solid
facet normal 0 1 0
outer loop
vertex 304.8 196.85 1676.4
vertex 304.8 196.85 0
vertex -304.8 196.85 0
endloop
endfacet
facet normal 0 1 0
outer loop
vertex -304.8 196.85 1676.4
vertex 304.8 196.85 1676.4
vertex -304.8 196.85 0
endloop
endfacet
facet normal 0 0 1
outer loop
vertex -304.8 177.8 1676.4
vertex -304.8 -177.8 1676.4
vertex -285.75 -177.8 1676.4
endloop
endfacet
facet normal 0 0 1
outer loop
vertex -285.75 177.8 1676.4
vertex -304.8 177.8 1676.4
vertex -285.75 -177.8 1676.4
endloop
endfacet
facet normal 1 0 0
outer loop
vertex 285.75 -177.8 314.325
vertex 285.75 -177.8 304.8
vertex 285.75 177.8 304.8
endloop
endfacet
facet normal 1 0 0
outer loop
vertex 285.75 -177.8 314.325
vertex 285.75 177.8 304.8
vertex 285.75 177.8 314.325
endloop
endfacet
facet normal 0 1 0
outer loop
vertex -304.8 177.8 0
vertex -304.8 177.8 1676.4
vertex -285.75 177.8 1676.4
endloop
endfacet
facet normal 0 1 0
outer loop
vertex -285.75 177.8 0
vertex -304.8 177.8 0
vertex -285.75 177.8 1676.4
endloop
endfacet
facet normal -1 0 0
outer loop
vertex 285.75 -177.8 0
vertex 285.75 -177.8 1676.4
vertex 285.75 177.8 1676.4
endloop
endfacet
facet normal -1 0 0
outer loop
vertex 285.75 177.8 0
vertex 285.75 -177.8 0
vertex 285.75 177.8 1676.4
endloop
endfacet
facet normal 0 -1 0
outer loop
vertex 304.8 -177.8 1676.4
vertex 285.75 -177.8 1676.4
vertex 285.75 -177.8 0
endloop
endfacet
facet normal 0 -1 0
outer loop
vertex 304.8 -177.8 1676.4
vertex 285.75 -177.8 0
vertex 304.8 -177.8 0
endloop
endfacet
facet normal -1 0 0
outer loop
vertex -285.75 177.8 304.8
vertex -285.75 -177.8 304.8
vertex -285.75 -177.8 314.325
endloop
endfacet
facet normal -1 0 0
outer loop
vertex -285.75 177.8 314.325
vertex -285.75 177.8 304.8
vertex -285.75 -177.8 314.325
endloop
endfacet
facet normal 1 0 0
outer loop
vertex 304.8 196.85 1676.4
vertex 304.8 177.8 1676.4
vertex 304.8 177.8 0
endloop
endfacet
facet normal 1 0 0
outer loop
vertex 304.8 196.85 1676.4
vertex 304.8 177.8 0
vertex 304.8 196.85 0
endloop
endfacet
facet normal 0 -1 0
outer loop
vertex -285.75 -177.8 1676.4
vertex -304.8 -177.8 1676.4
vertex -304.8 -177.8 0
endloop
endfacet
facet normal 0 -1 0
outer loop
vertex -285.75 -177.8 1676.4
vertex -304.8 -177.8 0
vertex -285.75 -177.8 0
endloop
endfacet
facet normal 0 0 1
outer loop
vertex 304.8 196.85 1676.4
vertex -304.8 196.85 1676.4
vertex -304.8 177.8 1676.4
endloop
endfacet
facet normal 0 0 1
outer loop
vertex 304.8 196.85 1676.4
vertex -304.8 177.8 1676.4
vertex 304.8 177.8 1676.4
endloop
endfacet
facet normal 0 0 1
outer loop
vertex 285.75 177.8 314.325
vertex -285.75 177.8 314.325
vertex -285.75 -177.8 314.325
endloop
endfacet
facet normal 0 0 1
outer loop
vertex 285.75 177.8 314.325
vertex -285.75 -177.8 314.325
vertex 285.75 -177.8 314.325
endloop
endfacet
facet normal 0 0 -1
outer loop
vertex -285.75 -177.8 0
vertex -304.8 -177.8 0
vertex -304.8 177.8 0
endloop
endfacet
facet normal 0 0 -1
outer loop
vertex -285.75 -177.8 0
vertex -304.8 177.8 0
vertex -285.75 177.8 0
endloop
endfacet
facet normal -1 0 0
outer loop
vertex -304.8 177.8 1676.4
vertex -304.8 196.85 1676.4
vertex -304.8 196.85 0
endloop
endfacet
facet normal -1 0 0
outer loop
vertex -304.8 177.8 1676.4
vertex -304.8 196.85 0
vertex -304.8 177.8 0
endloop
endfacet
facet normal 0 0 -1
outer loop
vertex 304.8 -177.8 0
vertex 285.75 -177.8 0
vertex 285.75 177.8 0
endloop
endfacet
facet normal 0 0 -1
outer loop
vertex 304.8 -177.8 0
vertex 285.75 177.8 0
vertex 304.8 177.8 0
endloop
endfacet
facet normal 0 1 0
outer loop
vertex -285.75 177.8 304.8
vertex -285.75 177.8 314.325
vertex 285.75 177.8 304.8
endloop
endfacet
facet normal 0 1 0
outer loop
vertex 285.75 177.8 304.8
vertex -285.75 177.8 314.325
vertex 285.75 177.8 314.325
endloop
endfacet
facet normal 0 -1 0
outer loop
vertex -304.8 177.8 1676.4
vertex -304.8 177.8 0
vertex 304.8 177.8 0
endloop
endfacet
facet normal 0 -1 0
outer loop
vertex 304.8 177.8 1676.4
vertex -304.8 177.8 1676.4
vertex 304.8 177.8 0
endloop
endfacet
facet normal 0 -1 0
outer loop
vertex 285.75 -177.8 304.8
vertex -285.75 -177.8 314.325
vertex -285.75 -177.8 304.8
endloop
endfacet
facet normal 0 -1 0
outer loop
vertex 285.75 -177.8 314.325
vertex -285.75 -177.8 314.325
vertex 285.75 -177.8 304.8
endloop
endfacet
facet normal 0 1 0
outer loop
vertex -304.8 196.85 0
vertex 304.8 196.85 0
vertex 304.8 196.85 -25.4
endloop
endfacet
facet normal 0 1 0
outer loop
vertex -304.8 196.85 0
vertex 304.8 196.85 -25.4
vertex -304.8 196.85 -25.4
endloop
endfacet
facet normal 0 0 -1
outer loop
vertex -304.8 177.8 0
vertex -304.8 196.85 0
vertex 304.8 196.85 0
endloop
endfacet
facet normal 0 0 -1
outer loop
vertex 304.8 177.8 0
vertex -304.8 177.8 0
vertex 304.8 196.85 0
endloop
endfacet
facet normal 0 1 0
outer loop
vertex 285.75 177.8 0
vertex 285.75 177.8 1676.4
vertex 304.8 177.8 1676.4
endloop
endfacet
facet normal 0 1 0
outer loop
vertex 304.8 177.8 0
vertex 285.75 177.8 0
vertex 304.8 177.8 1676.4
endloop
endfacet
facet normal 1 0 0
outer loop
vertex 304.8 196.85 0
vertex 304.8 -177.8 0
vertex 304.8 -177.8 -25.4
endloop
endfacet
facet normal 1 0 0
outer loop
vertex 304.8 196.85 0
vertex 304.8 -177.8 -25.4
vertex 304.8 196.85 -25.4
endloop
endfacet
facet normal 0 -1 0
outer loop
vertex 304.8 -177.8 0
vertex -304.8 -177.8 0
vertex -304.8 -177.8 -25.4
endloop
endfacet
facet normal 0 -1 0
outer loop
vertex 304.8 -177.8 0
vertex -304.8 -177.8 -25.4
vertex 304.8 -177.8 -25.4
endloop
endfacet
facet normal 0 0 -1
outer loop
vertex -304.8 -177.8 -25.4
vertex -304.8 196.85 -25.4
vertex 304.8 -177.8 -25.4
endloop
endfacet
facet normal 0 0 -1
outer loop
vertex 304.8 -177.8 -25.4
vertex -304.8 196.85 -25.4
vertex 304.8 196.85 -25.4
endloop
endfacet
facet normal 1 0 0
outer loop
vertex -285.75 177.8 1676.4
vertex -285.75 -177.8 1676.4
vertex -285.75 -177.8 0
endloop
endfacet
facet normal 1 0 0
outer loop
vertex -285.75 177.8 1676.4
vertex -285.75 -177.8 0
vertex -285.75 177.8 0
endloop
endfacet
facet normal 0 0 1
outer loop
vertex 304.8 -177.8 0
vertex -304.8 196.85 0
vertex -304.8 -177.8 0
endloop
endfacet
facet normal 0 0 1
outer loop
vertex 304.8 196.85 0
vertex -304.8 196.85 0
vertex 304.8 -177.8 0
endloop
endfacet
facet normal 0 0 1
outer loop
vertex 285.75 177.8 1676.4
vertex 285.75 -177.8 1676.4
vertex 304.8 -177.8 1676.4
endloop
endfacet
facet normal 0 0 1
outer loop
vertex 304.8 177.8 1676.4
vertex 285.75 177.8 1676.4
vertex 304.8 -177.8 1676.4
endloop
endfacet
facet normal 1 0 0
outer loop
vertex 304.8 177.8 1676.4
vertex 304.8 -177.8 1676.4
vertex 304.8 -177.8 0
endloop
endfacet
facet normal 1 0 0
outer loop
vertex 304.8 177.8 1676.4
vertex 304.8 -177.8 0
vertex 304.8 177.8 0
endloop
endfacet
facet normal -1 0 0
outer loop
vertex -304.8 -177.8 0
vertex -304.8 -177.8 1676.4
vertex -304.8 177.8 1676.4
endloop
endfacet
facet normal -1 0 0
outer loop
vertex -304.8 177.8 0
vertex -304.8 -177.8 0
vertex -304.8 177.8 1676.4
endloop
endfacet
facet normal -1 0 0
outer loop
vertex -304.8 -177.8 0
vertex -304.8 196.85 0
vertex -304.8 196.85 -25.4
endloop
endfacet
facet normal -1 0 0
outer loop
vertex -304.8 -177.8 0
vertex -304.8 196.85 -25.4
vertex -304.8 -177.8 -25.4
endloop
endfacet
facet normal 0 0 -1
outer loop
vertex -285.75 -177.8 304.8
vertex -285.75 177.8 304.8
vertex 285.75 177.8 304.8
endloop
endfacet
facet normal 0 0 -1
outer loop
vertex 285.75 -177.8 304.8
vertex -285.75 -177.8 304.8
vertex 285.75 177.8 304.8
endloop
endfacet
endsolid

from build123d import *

# Parameters (mm, degrees)
F1_DEPTH = 1676.4
F0_W     = 19.05
F0_H     = 355.6
F2_DEPTH = 1676.4
F0_W_2   = 571.5
F3_DEPTH = 25.4
F4_W     = 571.5
F4_H     = 9.525
F5_DEPTH = 355.6


with BuildPart() as f1:
    # F0 (on Top) → F1 (new body)
    with BuildSketch(Plane.XY):
        Polygon((285.75, 177.8), (304.8, 177.8), (304.8, 196.85), (-304.8, 196.85), (-304.8, 177.8), (-285.75, 177.8), align=None)
    extrude(amount=F1_DEPTH)


with BuildPart() as f2:
    # F0 (on Top) → F2 (new body)
    with BuildSketch(Plane.XY):
        with Locations((-295.275, 0)):
            Rectangle(F0_W, F0_H)
        with Locations((295.275, 0)):
            Rectangle(F0_W, F0_H)
    extrude(amount=F2_DEPTH)


with BuildPart() as f3:
    # F0 (on Top) → F3 (new body)
    with BuildSketch(Plane.XY):
        with Locations((295.275, 0)):
            Rectangle(F0_W, F0_H)
        Polygon((285.75, 177.8), (304.8, 177.8), (304.8, 196.85), (-304.8, 196.85), (-304.8, 177.8), (-285.75, 177.8), align=None)
        Rectangle(F0_W_2, F0_H)
        with Locations((-295.275, 0)):
            Rectangle(F0_W, F0_H)
    extrude(amount=-F3_DEPTH)


with BuildPart() as f5:
    # F4 (on face) → F5 (new body, through all)
    with BuildSketch(Plane.XZ.offset(-177.8)):
        with Locations((0, 309.5625)):
            Rectangle(F4_W, F4_H)
    extrude(amount=F5_DEPTH)


solid = Compound([f1.part, f2.part, f3.part, f5.part])
